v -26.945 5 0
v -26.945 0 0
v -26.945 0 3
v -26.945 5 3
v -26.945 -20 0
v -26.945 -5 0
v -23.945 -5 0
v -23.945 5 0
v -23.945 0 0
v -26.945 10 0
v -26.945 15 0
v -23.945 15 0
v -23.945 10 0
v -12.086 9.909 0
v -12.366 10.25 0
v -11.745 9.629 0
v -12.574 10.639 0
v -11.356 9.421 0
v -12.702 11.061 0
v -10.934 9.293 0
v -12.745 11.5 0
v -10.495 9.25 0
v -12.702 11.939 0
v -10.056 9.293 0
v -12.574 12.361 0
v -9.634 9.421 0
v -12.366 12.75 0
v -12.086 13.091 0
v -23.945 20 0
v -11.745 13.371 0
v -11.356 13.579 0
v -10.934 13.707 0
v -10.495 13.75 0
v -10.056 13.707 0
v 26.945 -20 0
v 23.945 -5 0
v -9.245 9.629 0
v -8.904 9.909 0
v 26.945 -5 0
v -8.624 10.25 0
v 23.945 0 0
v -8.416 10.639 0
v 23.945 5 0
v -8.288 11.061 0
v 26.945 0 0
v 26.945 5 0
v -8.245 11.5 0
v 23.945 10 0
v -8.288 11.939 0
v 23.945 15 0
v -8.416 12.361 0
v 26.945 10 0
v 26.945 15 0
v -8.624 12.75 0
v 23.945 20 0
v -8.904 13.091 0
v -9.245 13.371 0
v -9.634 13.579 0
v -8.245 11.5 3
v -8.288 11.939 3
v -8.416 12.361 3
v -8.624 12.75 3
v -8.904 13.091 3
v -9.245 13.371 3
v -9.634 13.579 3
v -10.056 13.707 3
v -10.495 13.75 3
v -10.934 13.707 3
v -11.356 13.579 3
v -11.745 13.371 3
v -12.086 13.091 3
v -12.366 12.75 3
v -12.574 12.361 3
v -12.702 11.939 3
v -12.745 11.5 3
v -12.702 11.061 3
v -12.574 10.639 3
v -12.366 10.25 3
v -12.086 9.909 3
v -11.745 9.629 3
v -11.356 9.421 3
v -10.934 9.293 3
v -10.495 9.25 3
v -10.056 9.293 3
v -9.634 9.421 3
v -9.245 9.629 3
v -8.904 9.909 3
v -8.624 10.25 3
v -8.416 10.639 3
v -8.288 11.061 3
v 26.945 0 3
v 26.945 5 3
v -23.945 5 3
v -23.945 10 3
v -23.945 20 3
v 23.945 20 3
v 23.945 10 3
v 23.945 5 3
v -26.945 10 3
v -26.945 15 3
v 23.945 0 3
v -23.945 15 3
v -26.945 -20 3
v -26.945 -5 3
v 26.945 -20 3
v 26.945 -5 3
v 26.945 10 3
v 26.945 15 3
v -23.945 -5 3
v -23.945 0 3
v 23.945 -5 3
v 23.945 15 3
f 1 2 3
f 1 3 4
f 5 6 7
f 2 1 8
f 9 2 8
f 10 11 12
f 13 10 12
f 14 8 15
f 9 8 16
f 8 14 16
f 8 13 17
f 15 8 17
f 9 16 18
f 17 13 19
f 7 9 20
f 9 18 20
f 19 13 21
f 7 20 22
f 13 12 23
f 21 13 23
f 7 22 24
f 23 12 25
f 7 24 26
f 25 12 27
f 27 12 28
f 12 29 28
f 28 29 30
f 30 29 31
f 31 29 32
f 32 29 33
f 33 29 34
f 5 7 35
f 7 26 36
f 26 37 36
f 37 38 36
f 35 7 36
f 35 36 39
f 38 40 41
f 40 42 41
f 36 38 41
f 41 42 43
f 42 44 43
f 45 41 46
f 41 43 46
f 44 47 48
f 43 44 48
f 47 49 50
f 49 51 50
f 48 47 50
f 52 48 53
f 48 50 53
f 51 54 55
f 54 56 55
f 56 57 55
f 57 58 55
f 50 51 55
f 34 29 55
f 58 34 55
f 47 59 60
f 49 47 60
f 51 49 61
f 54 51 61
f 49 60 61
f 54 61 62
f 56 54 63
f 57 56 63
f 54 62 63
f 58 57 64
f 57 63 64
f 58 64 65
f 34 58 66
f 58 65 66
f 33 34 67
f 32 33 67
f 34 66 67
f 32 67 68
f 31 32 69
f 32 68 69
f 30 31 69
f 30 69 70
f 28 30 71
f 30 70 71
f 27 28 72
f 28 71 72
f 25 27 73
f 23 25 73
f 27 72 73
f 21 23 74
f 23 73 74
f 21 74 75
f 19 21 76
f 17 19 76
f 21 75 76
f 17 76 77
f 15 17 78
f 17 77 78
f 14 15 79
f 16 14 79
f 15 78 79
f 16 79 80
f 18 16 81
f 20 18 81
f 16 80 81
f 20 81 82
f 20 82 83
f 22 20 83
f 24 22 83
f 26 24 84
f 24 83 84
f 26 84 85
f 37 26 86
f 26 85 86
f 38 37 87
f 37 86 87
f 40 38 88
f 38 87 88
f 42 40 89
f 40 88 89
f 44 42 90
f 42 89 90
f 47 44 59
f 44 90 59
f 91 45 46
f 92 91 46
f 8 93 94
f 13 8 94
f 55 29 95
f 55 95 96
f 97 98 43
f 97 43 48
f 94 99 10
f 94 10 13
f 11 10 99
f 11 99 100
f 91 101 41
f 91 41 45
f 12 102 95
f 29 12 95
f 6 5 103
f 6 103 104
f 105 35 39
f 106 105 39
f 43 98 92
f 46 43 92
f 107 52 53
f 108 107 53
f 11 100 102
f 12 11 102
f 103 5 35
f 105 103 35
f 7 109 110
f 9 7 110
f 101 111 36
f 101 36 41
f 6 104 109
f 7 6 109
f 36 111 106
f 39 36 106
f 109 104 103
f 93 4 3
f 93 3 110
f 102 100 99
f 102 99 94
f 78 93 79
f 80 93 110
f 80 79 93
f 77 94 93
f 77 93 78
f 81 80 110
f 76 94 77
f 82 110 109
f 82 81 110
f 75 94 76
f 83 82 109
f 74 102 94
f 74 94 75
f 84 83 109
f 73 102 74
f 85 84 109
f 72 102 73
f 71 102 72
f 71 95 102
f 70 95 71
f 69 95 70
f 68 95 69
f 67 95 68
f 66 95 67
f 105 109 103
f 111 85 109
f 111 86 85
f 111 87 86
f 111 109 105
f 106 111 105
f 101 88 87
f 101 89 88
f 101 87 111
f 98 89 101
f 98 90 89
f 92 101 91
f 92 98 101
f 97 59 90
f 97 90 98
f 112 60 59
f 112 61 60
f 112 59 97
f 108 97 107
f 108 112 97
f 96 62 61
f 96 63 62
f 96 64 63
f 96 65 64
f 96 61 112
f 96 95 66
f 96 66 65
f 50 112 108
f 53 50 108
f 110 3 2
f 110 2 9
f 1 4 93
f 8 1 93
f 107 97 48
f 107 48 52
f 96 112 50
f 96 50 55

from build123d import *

# Parameters (mm, degrees)
SKETCH1_W           = 53.89
SKETCH1_H           = 40
BOSS_EXTRUDE1_DEPTH = 3
SKETCH2_R           = 2.25
SKETCH2_W           = 3
SKETCH2_H           = 5
CUT_EXTRUDE1_DEPTH  = 3


with BuildPart() as part:
    # Sketch1 → Boss-Extrude1 (new body)
    with BuildSketch(Plane.XY):
        Rectangle(SKETCH1_W, SKETCH1_H)
    extrude(amount=BOSS_EXTRUDE1_DEPTH)

    # Sketch2 → Cut-Extrude1 (cut)
    with BuildSketch(Plane.XY.offset(3)):
        with Locations((-10.495, 11.5)):
            Circle(SKETCH2_R)
        with Locations((-25.445, 17.5)):
            Rectangle(SKETCH2_W, SKETCH2_H)
        with Locations((-25.445, 7.5)):
            Rectangle(SKETCH2_W, SKETCH2_H)
        with Locations((25.445, 17.5)):
            Rectangle(SKETCH2_W, SKETCH2_H)
        with Locations((25.445, 7.5)):
            Rectangle(SKETCH2_W, SKETCH2_H)
        with Locations((25.445, -2.5)):
            Rectangle(SKETCH2_W, SKETCH2_H)
        with Locations((-25.445, -2.5)):
            Rectangle(SKETCH2_W, SKETCH2_H)
    extrude(amount=-CUT_EXTRUDE1_DEPTH, mode=Mode.SUBTRACT)


solid = part.part
